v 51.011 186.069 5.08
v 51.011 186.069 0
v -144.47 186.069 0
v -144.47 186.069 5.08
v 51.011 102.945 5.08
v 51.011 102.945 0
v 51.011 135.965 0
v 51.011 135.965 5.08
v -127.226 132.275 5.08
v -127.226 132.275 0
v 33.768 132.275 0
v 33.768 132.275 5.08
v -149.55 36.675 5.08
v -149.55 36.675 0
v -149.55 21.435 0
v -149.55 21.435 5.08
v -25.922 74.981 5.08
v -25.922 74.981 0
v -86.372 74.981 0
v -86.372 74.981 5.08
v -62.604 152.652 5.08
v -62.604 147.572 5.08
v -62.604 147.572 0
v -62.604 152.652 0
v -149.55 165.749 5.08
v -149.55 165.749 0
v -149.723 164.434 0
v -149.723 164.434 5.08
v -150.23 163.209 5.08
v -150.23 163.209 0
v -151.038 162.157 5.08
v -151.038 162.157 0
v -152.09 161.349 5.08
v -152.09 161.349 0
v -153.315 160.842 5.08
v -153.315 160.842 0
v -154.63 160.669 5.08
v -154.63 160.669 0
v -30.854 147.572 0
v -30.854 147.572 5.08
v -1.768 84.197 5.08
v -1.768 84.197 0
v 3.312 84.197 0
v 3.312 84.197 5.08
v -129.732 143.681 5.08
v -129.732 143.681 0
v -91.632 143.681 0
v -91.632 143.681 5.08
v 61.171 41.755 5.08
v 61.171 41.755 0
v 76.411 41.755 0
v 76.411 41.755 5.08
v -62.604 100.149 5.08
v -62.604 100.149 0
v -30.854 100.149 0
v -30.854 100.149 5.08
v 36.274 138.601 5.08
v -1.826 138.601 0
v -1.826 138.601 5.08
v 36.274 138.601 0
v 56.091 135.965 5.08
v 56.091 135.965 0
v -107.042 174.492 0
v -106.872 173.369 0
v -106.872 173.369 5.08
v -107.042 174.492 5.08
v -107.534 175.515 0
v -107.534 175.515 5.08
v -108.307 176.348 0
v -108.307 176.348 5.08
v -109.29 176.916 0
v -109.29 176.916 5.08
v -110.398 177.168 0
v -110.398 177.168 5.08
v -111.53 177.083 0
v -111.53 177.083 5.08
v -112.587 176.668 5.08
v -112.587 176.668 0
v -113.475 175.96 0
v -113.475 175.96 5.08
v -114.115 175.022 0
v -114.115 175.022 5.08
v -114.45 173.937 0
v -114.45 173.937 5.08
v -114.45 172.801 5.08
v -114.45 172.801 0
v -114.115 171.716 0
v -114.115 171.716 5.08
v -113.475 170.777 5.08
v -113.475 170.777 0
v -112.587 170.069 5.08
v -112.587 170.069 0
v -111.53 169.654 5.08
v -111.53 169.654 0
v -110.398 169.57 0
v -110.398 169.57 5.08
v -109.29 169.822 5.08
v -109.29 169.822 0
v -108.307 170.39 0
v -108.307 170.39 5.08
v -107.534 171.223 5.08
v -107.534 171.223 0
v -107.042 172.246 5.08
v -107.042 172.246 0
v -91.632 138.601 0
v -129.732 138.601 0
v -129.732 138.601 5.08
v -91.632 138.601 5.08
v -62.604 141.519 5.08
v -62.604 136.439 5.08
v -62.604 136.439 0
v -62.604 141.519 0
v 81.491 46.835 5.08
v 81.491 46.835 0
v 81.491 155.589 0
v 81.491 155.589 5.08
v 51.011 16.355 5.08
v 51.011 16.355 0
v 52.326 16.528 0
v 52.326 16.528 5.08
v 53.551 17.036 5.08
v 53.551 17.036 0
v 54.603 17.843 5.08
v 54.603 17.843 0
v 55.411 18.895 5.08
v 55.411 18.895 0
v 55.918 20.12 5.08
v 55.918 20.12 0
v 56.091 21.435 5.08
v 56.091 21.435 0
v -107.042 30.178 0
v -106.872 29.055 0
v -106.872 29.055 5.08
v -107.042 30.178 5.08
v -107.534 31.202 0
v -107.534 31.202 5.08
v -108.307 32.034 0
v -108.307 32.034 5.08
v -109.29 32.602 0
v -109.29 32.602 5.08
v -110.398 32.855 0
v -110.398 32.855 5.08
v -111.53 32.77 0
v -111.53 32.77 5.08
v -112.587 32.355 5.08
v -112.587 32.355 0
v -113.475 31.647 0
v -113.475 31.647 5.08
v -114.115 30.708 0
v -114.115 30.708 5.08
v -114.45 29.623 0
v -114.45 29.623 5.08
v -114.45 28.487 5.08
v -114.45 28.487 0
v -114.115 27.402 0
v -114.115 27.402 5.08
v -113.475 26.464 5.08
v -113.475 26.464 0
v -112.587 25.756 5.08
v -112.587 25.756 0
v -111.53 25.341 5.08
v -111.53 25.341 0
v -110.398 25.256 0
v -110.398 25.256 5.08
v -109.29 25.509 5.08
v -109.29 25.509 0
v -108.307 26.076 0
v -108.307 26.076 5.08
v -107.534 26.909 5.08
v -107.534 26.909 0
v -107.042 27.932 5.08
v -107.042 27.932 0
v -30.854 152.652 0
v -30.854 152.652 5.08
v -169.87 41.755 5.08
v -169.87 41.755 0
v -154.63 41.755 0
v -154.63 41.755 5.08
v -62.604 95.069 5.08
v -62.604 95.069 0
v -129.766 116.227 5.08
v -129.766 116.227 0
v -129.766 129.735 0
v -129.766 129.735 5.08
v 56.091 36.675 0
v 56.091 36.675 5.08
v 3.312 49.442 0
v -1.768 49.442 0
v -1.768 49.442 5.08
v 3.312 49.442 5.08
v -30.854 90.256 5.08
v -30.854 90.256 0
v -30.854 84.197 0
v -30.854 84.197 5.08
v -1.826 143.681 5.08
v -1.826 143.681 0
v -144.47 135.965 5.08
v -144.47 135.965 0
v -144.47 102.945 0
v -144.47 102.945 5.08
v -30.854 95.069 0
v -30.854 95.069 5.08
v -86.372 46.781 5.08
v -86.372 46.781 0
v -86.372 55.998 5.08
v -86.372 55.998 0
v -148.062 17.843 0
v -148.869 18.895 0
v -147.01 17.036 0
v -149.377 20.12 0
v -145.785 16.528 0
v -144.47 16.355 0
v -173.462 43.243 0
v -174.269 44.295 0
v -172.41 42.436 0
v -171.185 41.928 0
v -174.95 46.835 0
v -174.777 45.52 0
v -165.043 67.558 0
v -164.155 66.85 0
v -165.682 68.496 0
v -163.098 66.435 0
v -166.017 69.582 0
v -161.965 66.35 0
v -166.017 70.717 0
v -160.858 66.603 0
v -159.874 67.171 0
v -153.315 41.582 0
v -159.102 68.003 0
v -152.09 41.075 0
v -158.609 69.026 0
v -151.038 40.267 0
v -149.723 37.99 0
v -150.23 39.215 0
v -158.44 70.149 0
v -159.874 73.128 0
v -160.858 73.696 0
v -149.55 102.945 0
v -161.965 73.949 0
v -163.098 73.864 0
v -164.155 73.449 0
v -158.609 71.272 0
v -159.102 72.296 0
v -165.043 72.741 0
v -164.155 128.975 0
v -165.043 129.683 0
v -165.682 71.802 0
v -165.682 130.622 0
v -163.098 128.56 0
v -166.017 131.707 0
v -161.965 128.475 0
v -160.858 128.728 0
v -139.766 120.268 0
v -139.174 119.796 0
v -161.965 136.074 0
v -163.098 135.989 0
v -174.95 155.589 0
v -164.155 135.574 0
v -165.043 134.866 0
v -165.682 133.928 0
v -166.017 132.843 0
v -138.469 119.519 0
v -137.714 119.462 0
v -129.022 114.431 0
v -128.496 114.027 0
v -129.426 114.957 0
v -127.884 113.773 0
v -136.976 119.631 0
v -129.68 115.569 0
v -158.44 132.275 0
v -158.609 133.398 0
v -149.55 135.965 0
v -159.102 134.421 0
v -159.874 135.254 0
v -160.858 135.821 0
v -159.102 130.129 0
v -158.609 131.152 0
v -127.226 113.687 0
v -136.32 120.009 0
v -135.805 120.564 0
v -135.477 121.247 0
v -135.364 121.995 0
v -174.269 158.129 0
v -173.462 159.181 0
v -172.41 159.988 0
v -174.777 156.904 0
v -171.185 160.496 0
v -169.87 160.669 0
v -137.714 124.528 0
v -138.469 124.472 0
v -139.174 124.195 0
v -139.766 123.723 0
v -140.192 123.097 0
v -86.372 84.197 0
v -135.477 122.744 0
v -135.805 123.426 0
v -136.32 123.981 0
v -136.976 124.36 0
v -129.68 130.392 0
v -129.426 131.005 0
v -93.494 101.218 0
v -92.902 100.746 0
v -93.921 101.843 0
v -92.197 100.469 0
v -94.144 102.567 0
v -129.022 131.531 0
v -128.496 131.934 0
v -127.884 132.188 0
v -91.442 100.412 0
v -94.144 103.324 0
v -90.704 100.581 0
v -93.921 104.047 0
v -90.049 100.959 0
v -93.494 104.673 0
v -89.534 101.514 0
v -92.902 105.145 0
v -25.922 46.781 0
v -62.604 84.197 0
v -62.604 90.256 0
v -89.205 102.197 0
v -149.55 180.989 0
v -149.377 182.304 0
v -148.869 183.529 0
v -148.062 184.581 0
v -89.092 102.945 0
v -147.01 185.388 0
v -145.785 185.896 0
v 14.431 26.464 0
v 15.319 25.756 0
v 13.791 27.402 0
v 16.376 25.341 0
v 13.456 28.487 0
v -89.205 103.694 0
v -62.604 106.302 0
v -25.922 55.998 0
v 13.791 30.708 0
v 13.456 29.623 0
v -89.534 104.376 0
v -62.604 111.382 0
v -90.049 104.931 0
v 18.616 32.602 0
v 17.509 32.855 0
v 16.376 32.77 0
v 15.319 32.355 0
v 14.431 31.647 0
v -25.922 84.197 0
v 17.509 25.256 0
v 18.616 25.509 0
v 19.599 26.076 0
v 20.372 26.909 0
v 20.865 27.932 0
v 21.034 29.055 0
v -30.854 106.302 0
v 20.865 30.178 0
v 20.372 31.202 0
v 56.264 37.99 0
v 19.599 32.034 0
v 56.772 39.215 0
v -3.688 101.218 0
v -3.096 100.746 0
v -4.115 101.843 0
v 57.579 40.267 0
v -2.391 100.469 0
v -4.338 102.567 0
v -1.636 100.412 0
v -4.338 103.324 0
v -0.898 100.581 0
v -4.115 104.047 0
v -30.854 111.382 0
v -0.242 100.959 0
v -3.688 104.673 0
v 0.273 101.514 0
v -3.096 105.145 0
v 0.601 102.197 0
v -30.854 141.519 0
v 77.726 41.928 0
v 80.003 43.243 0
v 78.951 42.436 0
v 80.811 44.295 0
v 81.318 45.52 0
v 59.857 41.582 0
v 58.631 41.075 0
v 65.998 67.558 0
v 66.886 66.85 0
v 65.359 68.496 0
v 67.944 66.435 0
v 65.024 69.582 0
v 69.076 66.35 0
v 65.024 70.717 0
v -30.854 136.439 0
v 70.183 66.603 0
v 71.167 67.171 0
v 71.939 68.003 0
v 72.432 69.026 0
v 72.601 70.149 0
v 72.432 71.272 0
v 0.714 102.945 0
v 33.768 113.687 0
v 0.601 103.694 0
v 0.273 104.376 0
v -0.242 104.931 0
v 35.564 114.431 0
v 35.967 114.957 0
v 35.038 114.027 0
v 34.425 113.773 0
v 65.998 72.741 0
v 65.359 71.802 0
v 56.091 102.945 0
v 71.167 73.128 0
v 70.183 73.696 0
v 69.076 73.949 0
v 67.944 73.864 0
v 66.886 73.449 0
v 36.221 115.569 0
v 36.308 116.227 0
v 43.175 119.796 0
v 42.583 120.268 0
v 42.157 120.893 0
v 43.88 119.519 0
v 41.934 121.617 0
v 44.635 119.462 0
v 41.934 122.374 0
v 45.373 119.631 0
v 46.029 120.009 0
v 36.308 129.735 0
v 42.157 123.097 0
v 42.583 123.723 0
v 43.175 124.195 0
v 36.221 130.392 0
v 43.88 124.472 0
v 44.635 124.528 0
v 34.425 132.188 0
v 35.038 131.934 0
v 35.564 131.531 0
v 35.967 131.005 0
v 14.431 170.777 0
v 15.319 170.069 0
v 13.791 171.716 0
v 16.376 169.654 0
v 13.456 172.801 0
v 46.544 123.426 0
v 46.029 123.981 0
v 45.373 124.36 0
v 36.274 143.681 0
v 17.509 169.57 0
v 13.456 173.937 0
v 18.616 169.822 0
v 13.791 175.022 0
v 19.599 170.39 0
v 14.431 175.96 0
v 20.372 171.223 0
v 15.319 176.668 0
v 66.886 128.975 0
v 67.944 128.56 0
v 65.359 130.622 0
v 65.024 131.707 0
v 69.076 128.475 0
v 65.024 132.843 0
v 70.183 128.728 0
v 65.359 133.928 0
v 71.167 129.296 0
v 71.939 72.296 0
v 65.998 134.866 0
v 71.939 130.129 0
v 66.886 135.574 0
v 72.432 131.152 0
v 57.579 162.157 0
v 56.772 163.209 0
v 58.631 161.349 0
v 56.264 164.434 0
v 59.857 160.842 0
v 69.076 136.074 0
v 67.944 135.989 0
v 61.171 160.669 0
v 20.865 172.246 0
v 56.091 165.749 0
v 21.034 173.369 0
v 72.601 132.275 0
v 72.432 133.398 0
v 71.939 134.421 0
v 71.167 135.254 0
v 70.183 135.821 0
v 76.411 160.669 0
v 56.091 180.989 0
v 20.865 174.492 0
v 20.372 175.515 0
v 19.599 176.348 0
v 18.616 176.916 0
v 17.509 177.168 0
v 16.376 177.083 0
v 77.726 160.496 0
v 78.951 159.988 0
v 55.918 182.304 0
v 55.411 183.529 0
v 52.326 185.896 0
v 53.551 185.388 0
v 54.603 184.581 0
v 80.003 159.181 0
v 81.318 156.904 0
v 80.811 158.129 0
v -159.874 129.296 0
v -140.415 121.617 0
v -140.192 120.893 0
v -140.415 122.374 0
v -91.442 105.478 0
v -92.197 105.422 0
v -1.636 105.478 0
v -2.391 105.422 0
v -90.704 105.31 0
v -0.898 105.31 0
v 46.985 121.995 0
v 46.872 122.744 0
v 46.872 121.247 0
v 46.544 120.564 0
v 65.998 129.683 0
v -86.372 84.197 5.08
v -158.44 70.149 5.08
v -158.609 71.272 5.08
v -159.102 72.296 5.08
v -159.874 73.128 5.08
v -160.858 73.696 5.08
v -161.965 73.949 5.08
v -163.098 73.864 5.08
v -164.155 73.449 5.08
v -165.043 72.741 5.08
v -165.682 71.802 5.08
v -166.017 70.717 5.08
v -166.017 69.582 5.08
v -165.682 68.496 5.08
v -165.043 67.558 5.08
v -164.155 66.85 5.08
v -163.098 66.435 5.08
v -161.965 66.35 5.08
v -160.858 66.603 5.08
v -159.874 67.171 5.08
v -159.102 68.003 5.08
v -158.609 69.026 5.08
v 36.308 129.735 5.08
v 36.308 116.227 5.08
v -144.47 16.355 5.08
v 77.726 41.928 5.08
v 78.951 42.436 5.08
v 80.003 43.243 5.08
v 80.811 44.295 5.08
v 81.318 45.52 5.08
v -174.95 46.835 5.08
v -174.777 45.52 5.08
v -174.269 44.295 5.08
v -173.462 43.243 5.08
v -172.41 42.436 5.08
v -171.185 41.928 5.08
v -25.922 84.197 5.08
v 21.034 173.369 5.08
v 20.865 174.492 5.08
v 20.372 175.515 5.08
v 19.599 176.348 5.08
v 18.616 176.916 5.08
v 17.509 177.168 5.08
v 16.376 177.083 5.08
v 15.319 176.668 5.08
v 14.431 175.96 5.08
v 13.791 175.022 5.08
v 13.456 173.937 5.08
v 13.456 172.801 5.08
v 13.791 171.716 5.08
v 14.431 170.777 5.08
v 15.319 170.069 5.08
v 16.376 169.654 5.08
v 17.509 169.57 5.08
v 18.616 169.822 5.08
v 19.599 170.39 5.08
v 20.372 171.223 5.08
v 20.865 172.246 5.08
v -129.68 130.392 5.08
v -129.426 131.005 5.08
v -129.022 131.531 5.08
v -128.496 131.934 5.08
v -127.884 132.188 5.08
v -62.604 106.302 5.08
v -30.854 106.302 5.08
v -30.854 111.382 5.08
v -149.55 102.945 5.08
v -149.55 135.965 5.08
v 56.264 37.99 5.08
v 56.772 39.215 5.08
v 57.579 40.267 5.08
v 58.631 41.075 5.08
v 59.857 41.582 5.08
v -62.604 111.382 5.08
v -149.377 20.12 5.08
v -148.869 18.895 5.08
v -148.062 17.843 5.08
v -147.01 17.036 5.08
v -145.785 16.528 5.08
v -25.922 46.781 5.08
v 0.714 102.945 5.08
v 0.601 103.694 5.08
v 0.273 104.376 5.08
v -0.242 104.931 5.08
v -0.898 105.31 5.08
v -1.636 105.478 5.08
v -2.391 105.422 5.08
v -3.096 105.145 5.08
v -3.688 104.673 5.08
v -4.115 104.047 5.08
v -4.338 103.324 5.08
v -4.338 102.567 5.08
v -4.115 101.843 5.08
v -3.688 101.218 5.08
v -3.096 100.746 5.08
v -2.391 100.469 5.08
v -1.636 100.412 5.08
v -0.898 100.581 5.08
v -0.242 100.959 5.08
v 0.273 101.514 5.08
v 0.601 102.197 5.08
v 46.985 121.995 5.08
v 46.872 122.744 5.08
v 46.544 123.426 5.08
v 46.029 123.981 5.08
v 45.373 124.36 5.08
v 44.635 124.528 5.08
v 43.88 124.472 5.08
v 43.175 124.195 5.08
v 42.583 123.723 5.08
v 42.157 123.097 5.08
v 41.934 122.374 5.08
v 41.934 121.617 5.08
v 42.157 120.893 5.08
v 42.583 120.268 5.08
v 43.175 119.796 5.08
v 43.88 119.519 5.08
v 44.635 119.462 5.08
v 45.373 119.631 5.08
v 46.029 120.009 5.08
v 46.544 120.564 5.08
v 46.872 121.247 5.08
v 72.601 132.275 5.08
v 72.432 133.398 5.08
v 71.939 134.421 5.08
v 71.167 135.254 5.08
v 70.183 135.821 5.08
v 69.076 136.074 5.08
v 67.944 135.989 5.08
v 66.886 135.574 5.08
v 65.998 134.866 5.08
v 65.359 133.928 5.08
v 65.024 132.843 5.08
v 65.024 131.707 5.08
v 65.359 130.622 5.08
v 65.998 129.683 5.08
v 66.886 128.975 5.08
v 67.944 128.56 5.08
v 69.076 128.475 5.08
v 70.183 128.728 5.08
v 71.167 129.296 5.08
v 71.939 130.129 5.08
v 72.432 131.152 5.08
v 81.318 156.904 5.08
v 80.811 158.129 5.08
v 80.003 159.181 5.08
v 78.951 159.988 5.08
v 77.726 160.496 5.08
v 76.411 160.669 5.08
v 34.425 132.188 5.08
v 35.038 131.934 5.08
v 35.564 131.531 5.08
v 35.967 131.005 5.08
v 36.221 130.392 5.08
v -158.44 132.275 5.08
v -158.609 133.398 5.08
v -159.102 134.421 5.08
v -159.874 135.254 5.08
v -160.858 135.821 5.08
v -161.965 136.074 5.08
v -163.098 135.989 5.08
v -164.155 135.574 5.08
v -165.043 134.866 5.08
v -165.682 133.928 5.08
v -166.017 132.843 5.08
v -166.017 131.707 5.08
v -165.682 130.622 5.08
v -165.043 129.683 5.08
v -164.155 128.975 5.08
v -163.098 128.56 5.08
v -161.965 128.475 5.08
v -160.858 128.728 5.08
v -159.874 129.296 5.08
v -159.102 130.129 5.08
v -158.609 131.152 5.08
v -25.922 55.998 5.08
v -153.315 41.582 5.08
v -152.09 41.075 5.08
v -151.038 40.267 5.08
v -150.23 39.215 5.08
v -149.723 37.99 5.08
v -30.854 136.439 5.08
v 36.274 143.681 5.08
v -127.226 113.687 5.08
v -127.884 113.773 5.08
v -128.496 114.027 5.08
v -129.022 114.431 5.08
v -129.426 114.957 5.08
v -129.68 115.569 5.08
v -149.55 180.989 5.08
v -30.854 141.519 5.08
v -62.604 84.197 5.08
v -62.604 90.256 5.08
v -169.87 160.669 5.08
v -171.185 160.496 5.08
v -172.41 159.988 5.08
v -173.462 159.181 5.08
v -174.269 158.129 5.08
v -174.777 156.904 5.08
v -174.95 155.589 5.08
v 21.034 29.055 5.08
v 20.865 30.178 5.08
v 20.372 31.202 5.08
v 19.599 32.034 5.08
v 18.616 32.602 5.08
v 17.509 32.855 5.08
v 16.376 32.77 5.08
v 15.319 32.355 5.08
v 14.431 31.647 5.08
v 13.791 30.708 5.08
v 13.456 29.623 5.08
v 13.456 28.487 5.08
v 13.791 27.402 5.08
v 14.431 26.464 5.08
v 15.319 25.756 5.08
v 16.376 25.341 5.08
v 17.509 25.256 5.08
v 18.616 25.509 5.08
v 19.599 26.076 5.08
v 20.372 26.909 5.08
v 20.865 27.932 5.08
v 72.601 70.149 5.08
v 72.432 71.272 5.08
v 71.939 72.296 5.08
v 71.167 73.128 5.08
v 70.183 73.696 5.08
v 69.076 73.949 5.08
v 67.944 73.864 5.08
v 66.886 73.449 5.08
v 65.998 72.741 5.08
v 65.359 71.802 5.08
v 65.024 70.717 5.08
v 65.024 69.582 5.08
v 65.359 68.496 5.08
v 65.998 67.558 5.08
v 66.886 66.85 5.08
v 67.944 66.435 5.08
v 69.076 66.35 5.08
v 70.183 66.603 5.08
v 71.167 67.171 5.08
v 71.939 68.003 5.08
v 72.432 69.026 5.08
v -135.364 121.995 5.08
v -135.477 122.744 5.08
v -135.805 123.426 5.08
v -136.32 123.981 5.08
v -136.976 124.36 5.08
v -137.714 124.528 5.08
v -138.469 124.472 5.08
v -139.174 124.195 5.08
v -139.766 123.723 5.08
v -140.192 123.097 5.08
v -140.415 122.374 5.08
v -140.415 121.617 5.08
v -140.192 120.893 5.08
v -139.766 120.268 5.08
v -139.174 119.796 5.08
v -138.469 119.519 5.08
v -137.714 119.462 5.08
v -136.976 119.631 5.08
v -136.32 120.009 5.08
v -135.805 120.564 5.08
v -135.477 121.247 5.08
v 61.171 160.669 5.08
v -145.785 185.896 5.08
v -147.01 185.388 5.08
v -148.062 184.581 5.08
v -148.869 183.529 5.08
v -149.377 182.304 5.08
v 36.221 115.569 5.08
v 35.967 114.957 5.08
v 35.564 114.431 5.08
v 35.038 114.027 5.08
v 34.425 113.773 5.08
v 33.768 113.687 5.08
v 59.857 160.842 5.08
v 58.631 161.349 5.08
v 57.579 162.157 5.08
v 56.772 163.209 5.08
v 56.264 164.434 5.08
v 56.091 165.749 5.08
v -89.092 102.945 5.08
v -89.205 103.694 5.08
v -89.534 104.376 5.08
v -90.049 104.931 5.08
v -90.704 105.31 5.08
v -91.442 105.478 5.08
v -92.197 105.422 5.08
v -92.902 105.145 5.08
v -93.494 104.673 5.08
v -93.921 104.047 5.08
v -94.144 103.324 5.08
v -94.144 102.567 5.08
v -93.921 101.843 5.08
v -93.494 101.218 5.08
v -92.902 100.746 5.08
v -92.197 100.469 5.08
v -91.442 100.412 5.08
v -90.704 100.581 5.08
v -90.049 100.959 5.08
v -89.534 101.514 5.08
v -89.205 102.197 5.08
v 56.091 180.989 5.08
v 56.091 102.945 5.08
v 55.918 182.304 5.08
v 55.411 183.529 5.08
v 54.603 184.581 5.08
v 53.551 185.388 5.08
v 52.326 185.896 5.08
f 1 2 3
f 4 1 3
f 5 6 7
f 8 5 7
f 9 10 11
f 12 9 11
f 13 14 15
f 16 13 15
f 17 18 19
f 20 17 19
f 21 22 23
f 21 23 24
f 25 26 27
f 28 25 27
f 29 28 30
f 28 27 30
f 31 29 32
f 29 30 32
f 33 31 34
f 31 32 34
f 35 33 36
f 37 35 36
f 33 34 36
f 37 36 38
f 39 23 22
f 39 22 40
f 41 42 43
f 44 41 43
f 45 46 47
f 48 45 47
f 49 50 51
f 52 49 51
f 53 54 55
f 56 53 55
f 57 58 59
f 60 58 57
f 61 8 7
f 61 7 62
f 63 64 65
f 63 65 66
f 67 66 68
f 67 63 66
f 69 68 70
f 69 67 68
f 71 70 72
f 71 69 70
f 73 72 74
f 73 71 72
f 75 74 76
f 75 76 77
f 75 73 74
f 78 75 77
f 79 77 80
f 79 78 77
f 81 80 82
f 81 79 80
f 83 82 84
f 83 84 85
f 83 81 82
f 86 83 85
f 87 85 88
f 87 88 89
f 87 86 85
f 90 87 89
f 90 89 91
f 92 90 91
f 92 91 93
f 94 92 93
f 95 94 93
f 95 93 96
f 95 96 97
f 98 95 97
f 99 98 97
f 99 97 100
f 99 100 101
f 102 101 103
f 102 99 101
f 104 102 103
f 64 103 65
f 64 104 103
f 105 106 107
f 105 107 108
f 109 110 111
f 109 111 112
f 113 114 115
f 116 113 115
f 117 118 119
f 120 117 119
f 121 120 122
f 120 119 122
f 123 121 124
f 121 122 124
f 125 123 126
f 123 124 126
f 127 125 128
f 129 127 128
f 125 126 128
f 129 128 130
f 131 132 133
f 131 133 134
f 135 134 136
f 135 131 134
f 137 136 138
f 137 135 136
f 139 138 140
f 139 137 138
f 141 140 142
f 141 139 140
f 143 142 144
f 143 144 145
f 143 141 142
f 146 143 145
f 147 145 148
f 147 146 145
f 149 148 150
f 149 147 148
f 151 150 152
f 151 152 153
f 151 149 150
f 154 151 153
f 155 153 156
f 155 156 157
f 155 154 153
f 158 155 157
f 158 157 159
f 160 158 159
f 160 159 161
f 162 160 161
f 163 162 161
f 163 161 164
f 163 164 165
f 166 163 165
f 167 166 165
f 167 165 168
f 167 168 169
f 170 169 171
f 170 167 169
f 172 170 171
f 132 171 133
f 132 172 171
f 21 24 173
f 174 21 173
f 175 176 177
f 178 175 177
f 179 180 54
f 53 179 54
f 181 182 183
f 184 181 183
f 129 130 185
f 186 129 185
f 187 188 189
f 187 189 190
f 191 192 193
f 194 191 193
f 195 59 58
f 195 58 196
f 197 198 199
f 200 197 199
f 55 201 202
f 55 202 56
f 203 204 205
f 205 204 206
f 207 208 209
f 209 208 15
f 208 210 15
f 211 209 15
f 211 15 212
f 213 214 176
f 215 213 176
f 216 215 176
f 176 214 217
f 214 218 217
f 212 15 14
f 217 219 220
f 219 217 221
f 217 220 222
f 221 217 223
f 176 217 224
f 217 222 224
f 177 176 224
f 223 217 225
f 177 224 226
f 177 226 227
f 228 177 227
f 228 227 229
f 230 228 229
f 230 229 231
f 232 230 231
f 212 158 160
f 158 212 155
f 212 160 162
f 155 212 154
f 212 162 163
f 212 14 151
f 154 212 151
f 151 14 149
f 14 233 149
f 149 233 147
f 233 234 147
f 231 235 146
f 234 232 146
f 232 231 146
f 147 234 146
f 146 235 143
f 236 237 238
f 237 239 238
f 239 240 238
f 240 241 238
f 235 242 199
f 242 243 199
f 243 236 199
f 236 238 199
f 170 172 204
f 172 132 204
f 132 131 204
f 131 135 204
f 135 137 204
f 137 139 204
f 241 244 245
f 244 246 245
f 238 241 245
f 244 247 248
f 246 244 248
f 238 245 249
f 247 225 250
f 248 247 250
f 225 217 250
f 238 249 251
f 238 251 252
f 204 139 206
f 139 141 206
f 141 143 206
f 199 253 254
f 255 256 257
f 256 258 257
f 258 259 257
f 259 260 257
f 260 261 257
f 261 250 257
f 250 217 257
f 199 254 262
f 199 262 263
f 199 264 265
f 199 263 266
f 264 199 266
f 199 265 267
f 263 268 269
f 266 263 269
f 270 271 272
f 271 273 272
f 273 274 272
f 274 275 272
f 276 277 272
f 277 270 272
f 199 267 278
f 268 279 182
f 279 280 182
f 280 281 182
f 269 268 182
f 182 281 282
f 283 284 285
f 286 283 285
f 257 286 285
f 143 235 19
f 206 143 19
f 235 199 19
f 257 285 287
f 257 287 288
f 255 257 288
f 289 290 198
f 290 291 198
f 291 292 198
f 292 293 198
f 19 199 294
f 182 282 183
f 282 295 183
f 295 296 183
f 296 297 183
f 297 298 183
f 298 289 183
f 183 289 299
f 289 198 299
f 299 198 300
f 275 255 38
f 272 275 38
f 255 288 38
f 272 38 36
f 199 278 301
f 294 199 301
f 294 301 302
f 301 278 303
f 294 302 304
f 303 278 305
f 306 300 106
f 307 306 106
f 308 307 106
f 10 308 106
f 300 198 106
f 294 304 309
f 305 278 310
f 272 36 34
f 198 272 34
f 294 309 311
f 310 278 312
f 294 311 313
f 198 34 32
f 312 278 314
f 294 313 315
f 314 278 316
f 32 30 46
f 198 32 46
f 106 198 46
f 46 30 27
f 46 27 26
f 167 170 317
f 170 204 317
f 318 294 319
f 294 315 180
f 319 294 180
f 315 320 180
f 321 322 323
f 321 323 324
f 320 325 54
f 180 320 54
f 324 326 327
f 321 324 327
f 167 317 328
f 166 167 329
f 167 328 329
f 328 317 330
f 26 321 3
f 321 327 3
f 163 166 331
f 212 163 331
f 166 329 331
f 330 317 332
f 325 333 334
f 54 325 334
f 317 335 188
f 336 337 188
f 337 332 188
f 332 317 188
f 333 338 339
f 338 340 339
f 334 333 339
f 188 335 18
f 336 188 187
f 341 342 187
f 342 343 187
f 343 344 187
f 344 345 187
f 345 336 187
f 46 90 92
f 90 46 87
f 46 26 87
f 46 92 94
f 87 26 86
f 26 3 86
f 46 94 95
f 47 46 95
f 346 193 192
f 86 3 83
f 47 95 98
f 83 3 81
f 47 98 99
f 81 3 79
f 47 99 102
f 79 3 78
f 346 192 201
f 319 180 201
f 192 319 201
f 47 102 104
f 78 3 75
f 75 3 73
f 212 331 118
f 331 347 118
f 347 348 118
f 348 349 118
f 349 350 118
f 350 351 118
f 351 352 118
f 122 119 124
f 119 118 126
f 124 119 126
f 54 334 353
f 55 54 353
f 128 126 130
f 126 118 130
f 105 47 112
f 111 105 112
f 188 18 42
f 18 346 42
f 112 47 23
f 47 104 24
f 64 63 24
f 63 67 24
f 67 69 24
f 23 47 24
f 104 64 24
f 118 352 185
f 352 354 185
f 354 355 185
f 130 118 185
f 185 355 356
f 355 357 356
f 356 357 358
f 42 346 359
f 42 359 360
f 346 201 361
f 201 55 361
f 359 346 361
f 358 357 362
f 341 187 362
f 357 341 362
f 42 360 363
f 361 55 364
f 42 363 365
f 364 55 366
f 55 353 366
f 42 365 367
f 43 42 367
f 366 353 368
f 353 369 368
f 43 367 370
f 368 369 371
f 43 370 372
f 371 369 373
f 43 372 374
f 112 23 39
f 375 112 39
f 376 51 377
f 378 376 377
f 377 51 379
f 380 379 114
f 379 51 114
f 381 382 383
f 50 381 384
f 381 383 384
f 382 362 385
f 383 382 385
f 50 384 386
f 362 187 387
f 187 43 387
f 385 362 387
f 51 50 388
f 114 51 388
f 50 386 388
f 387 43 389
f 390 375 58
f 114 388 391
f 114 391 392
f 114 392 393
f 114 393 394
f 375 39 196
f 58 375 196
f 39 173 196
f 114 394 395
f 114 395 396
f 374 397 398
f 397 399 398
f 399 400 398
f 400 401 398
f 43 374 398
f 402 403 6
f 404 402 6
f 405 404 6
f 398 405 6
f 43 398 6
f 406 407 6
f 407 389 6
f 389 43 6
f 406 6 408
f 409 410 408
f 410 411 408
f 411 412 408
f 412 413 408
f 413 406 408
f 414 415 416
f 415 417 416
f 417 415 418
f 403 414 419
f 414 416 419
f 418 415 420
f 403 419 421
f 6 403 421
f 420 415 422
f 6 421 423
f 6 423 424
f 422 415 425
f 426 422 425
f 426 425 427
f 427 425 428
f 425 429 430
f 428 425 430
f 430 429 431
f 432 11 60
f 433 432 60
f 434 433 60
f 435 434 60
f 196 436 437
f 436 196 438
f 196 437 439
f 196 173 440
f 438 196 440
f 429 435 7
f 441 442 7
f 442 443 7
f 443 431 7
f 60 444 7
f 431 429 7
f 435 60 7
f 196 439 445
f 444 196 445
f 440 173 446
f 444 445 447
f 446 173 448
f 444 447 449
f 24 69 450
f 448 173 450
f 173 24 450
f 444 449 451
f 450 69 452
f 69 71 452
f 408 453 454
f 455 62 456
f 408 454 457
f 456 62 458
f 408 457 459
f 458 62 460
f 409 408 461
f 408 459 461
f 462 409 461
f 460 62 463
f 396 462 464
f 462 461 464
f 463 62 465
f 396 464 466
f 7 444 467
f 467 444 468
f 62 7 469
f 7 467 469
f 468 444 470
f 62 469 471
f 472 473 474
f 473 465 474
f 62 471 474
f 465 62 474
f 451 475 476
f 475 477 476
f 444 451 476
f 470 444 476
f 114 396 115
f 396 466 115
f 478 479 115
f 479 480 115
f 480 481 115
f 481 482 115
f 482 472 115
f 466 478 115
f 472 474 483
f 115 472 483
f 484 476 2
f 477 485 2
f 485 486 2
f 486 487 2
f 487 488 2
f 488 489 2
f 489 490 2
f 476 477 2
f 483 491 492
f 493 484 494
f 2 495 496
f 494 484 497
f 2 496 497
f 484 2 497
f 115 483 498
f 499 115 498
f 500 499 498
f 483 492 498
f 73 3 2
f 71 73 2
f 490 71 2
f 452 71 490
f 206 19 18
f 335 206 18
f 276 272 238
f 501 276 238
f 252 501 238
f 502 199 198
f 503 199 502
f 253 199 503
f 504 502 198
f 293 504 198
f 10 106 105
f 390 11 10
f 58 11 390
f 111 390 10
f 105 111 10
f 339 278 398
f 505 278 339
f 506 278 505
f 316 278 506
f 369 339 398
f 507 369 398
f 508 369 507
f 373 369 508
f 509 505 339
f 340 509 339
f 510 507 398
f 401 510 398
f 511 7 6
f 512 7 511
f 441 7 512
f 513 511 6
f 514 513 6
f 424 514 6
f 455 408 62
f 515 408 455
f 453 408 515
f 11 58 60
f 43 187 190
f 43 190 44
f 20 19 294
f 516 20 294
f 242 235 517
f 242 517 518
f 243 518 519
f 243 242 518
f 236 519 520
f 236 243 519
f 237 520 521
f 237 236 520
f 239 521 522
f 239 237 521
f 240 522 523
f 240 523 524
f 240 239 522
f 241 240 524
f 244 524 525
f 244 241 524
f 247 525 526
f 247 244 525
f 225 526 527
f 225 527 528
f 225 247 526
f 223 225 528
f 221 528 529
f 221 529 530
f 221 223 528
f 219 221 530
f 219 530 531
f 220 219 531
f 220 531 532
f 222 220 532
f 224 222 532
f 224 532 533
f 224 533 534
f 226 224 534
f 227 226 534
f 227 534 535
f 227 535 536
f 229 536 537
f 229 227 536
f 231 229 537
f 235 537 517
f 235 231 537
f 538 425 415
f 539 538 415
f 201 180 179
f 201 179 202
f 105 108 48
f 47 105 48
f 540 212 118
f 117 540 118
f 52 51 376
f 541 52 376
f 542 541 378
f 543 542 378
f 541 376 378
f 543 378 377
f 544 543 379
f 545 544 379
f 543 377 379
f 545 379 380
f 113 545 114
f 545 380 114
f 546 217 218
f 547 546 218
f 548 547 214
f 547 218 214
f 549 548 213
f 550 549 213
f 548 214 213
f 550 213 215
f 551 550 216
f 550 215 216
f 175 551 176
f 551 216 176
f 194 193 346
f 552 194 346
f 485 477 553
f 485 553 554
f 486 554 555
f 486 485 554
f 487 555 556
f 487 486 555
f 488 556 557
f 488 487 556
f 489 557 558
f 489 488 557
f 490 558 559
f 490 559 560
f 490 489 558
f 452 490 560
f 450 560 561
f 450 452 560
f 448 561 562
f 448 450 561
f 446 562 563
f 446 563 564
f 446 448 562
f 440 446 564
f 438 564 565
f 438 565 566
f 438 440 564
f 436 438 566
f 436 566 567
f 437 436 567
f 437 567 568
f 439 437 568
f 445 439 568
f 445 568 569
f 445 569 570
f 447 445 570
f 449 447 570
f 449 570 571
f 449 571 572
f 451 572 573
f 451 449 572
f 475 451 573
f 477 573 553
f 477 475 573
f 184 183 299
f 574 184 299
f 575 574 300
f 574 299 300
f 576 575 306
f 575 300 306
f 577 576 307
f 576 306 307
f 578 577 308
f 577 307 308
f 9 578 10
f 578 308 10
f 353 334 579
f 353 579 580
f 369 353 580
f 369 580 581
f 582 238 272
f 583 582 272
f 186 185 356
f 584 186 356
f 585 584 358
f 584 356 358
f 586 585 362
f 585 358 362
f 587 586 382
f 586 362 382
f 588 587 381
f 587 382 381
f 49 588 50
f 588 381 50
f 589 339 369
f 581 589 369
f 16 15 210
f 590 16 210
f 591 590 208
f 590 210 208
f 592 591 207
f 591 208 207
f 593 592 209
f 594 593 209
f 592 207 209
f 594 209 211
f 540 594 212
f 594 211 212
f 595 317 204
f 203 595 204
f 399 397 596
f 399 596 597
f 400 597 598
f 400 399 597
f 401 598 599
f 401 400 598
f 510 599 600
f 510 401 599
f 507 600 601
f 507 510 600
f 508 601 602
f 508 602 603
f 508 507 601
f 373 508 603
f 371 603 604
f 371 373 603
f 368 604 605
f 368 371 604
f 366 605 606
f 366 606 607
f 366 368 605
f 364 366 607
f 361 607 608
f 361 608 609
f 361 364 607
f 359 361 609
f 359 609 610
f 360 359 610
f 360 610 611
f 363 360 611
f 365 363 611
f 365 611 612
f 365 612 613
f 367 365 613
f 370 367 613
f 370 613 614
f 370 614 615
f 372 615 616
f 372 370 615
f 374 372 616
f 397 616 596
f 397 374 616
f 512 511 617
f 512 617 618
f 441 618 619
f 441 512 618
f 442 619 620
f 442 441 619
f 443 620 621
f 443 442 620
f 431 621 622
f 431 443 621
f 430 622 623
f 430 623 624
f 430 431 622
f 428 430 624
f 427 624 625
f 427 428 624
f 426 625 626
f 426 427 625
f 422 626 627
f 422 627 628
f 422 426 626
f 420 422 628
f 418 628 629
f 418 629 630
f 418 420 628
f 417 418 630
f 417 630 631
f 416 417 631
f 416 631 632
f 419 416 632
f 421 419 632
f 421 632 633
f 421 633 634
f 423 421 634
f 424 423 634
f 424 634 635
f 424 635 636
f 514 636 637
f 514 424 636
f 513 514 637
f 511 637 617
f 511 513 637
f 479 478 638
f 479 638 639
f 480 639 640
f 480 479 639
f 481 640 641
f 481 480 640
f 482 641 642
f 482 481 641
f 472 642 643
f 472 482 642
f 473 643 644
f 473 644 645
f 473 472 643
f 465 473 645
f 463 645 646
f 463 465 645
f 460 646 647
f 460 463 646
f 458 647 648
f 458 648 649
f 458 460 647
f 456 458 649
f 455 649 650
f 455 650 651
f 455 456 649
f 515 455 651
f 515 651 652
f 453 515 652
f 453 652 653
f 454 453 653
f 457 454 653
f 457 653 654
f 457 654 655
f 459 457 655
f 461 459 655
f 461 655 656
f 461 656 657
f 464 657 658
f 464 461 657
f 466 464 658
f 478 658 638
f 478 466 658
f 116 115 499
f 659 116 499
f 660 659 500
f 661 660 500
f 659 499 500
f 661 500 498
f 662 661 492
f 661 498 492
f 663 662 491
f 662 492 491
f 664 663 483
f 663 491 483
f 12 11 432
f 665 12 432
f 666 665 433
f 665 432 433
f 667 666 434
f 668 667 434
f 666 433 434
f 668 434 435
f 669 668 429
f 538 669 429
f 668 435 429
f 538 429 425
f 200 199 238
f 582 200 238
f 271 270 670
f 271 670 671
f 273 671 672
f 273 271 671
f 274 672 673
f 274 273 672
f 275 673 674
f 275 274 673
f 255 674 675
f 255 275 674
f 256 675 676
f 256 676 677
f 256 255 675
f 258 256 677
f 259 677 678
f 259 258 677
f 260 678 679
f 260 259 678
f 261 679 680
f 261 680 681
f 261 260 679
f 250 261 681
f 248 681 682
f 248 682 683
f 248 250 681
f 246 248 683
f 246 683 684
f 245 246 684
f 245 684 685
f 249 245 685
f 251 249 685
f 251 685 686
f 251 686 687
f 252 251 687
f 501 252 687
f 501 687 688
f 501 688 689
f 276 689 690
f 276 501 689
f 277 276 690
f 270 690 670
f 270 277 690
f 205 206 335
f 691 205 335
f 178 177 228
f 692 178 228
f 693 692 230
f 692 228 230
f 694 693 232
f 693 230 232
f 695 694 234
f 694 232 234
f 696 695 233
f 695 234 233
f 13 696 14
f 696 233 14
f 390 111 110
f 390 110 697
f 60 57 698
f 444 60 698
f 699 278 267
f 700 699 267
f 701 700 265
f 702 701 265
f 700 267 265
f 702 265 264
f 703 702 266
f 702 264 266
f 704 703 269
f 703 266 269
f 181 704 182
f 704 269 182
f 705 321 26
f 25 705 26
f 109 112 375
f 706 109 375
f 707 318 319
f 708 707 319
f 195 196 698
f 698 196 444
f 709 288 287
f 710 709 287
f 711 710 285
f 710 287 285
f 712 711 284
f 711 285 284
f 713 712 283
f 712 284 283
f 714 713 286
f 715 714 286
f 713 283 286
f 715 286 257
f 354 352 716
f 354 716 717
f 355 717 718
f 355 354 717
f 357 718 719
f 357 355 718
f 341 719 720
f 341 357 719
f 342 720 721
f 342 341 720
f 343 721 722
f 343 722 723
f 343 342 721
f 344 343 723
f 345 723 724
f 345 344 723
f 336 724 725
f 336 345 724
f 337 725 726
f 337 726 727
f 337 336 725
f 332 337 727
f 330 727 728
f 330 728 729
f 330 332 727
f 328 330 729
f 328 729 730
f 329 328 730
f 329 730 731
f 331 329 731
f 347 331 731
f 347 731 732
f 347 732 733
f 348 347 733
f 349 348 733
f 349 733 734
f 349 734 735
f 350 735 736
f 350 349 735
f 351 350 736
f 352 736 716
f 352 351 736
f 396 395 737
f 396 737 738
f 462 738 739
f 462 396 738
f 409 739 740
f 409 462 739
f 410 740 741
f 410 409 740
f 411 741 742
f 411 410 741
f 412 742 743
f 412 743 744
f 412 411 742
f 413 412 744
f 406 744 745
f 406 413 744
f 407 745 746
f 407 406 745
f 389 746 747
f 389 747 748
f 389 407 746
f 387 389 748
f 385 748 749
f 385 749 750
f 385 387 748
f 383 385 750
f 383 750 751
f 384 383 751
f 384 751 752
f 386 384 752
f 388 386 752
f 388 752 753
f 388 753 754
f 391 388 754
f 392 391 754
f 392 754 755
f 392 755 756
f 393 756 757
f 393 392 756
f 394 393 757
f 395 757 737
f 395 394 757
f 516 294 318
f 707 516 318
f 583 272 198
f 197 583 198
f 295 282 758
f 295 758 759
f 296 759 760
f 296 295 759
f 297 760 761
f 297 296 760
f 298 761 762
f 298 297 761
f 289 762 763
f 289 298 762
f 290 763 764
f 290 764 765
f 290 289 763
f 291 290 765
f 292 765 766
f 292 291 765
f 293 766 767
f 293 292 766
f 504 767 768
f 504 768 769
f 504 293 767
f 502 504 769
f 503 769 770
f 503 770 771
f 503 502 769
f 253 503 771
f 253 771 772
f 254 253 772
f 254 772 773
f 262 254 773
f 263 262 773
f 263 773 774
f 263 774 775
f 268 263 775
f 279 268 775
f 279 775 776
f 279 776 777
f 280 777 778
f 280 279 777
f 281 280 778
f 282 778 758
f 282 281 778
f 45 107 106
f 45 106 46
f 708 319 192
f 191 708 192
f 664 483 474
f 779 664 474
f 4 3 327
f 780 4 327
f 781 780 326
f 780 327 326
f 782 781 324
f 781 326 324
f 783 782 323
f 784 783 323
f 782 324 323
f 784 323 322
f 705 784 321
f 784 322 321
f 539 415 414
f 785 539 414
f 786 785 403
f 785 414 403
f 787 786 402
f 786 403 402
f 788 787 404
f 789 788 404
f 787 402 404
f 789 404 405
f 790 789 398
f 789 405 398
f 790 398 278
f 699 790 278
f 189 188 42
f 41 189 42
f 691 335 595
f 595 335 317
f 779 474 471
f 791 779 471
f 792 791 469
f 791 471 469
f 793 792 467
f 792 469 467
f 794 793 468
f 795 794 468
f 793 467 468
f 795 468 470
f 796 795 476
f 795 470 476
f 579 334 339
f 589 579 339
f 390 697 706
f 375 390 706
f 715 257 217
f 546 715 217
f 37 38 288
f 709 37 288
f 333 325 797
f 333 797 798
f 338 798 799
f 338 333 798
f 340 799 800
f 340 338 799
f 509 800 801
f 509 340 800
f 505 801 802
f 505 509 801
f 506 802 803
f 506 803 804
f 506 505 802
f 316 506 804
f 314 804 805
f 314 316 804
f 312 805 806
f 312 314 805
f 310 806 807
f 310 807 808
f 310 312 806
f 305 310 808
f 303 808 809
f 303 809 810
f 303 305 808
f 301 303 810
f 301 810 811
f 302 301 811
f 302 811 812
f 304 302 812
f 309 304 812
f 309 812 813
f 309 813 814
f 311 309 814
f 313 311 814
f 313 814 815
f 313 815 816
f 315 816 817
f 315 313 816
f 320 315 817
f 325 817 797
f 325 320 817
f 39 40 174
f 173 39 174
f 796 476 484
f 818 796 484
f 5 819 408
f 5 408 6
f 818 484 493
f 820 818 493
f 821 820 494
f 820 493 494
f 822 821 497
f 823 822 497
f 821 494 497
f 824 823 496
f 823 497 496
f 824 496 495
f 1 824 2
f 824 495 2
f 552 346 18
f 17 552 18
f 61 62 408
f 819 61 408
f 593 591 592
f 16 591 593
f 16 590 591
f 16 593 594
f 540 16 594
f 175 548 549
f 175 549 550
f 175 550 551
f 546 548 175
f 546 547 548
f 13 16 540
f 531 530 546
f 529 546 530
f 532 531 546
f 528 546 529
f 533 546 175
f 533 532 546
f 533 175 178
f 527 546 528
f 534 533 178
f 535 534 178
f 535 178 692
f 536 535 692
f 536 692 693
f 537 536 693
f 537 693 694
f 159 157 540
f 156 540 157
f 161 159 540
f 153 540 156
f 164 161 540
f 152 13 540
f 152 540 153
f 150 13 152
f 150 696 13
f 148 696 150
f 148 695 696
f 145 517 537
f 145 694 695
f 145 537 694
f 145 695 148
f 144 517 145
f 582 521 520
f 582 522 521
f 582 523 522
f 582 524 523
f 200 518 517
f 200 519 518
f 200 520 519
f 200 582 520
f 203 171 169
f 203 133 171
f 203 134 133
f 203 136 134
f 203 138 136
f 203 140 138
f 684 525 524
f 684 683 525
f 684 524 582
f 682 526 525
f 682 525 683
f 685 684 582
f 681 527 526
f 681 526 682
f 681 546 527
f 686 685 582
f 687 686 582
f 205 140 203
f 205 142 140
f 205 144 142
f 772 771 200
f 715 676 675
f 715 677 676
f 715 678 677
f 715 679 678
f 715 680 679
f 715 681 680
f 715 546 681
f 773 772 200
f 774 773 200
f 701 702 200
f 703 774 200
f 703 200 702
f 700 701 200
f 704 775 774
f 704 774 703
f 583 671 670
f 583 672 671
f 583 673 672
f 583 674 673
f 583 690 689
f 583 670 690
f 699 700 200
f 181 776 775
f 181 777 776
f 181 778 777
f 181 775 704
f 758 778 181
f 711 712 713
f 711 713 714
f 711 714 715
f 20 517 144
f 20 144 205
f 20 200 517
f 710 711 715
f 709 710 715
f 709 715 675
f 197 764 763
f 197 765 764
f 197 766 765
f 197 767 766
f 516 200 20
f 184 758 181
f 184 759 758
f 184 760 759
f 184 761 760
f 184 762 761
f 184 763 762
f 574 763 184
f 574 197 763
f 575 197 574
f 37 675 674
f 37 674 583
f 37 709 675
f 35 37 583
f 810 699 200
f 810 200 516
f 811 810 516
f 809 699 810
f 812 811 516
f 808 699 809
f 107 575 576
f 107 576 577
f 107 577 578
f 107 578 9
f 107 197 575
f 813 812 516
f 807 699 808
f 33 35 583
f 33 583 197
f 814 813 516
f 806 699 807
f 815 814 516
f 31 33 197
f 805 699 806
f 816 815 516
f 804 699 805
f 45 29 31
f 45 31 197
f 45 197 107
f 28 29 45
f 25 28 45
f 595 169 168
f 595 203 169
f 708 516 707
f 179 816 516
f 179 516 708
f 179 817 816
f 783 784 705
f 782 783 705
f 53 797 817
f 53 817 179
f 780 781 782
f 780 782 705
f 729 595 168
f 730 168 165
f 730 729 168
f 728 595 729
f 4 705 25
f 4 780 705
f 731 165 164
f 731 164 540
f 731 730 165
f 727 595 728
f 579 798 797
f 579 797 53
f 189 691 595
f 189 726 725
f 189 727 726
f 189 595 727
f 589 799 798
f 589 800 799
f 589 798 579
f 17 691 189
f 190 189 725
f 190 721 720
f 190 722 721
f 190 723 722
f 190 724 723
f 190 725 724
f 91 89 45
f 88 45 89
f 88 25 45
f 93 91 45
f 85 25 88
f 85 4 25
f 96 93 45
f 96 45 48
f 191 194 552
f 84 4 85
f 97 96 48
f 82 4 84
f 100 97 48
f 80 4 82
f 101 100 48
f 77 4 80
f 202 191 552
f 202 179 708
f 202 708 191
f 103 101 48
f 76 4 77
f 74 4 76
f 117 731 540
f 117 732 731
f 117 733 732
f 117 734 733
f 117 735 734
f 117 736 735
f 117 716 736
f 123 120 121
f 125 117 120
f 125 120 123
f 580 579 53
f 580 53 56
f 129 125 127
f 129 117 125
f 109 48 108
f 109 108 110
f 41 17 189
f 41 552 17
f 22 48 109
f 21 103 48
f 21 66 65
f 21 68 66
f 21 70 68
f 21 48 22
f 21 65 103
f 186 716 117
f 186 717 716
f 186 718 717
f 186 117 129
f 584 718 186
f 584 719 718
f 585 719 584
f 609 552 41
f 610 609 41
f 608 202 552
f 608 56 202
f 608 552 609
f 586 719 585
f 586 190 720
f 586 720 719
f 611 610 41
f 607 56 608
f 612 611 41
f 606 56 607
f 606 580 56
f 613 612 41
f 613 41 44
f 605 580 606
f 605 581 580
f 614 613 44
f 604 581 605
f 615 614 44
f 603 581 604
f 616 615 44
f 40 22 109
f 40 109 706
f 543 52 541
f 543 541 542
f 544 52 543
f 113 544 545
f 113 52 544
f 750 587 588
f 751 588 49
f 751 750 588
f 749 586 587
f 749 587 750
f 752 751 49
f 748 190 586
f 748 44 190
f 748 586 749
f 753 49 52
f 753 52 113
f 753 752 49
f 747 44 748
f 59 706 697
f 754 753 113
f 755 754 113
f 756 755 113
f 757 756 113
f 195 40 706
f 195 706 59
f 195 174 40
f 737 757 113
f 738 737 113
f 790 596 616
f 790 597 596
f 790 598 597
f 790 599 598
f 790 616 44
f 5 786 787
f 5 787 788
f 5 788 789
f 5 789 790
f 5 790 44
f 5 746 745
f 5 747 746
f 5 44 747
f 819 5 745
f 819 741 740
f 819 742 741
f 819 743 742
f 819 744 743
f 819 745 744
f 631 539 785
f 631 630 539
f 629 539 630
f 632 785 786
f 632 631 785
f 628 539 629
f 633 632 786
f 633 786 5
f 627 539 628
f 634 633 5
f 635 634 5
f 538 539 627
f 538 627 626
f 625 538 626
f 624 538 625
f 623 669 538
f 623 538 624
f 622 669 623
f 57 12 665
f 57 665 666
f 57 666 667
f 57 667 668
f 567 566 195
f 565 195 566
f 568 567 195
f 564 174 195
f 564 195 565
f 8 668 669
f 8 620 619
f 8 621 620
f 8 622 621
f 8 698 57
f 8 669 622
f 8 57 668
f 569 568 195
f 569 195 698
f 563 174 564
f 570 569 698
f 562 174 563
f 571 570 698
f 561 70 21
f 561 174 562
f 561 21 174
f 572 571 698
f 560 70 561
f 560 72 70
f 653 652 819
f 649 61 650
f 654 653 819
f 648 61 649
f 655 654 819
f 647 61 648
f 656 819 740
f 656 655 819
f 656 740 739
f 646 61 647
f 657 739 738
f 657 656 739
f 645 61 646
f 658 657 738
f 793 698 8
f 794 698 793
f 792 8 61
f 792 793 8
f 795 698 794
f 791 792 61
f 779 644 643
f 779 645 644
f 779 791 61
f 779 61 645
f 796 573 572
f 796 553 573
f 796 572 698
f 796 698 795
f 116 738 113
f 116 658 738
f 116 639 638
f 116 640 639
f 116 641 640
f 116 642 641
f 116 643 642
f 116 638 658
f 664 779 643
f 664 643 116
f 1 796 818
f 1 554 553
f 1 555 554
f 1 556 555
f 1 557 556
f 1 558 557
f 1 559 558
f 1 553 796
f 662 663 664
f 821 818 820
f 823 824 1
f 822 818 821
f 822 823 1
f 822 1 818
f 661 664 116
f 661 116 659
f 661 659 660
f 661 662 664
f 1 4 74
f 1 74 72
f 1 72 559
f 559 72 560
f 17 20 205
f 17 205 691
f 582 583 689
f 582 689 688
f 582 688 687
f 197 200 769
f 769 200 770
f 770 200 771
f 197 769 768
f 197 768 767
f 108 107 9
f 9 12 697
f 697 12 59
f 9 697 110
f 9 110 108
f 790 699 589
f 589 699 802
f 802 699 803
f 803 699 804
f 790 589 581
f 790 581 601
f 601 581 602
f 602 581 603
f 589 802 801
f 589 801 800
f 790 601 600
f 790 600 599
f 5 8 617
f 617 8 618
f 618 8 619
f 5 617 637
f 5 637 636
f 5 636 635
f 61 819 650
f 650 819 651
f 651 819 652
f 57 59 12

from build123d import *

# Parameters (mm, degrees)
SKETCH1_R           = 3.81
SKETCH1_W           = 5.08
SKETCH1_H           = 34.754656801
SKETCH1_W_2         = 31.75
SKETCH1_H_2         = 5.08
SKETCH1_R_2         = 2.54
SKETCH1_W_3         = 38.1
BOSS_EXTRUDE1_DEPTH = 5.08


with BuildPart() as part:
    # Sketch1 → Boss-Extrude1 (new body)
    with BuildSketch(Plane.XY):
        with BuildLine():
            ThreePointArc((51.011314264, 16.355277108), (54.603416713, 17.84317466), (56.091314264, 21.435277108))
            Line((56.091314264, 21.435277108), (56.091314264, 36.675277108))
            ThreePointArc((56.091314264, 36.675277108), (57.579211816, 40.267379557), (61.171314264, 41.755277108))
            Line((61.171314264, 41.755277108), (76.411314264, 41.755277108))
            ThreePointArc((76.411314264, 41.755277108), (80.003416713, 43.24317466), (81.491314264, 46.835277108))
            Line((81.491314264, 46.835277108), (81.491314264, 155.588877174))
            ThreePointArc((81.491314264, 155.588877174), (80.003416713, 159.180979622), (76.411314264, 160.668877174))
            Line((76.411314264, 160.668877174), (61.171314264, 160.668877174))
            ThreePointArc((61.171314264, 160.668877174), (57.579211816, 162.156774726), (56.091314264, 165.748877174))
            Line((56.091314264, 165.748877174), (56.091314264, 180.988877174))
            ThreePointArc((56.091314264, 180.988877174), (54.603416713, 184.580979622), (51.011314264, 186.068877174))
            Line((51.011314264, 186.068877174), (-144.469703574, 186.068877174))
            ThreePointArc((-144.469703574, 186.068877174), (-148.061806022, 184.580979622), (-149.549703574, 180.988877174))
            Line((-149.549703574, 180.988877174), (-149.549703574, 165.748877174))
            ThreePointArc((-149.549703574, 165.748877174), (-151.037601126, 162.156774726), (-154.629703574, 160.668877174))
            Line((-154.629703574, 160.668877174), (-169.869703574, 160.668877174))
            ThreePointArc((-169.869703574, 160.668877174), (-173.461806022, 159.180979622), (-174.949703574, 155.588877174))
            Line((-174.949703574, 155.588877174), (-174.949703574, 46.835277108))
            ThreePointArc((-174.949703574, 46.835277108), (-173.461806022, 43.24317466), (-169.869703574, 41.755277108))
            Line((-169.869703574, 41.755277108), (-154.629703574, 41.755277108))
            ThreePointArc((-154.629703574, 41.755277108), (-151.037601126, 40.267379557), (-149.549703574, 36.675277108))
            Line((-149.549703574, 36.675277108), (-149.549703574, 21.435277108))
            ThreePointArc((-149.549703574, 21.435277108), (-148.061806022, 17.84317466), (-144.469703574, 16.355277108))
            Line((-144.469703574, 16.355277108), (51.011314264, 16.355277108))
        make_face()
        with Locations((-110.682245407, 29.055277108)):
            Circle(SKETCH1_R, mode=Mode.SUBTRACT)
        Polygon((-25.922239135, 55.997635261), (-25.922239135, 49.700309173), (-25.922239135, 46.781251801), (-86.372159657, 46.781251801), (-86.372159657, 55.997635261), align=None, mode=Mode.SUBTRACT)
        with Locations((-162.249703574, 70.149378101)):
            Circle(SKETCH1_R, mode=Mode.SUBTRACT)
        Polygon((-25.922239135, 84.197043075), (-25.922239135, 77.899716987), (-25.922239135, 74.980659615), (-86.372159657, 74.980659615), (-86.372159657, 84.197043075), (-62.604194655, 84.197043075), (-62.604194655, 90.255887093), (-30.854194655, 90.255887093), (-30.854194655, 84.197043075), align=None, mode=Mode.SUBTRACT)
        with Locations((17.223856098, 29.055277108)):
            Circle(SKETCH1_R, mode=Mode.SUBTRACT)
        with Locations((0.772267685, 66.819714675)):
            Rectangle(SKETCH1_W, SKETCH1_H, mode=Mode.SUBTRACT)
        with Locations((-46.729194655, 97.608815198)):
            Rectangle(SKETCH1_W_2, SKETCH1_H_2, mode=Mode.SUBTRACT)
        with Locations((68.791314264, 70.149378101)):
            Circle(SKETCH1_R, mode=Mode.SUBTRACT)
        Polygon((-149.549703574, 135.965208253), (-144.469703574, 135.965208253), (-144.469703574, 127.195635913), (-144.469703574, 102.945208253), (-149.549703574, 102.945208253), align=None, mode=Mode.SUBTRACT)
        with Locations((-137.903692136, 121.995208253)):
            Circle(SKETCH1_R_2, mode=Mode.SUBTRACT)
        with Locations((-162.249703574, 132.274776181)):
            Circle(SKETCH1_R, mode=Mode.SUBTRACT)
        with Locations((-91.632245407, 102.945208253)):
            Circle(SKETCH1_R_2, mode=Mode.SUBTRACT)
        with Locations((-110.682245407, 141.140921067)):
            Rectangle(SKETCH1_W_3, SKETCH1_H_2, mode=Mode.SUBTRACT)
        with Locations((-110.682245407, 173.368877174)):
            Circle(SKETCH1_R, mode=Mode.SUBTRACT)
        with Locations((-46.729194655, 108.841683137)):
            Rectangle(SKETCH1_W_2, SKETCH1_H_2, mode=Mode.SUBTRACT)
        with Locations((-1.826143902, 102.945208253)):
            Circle(SKETCH1_R_2, mode=Mode.SUBTRACT)
        with BuildLine():
            ThreePointArc((33.767746549, 132.274776181), (35.563797773, 131.530827406), (36.307746549, 129.734776181))
            Line((36.307746549, 129.734776181), (36.307746549, 127.195635913))
            Line((36.307746549, 127.195635913), (36.307746549, 116.226694176))
            ThreePointArc((36.307746549, 116.226694176), (35.563797773, 114.430642952), (33.767746549, 113.686694176))
            Line((33.767746549, 113.686694176), (-127.226135859, 113.686694176))
            ThreePointArc((-127.226135859, 113.686694176), (-129.022187083, 114.430642952), (-129.766135859, 116.226694176))
            Line((-129.766135859, 116.226694176), (-129.766135859, 127.195635913))
            Line((-129.766135859, 127.195635913), (-129.766135859, 129.734776181))
            ThreePointArc((-129.766135859, 129.734776181), (-129.022187083, 131.530827406), (-127.226135859, 132.274776181))
            Line((-127.226135859, 132.274776181), (33.767746549, 132.274776181))
        make_face(mode=Mode.SUBTRACT)
        with Locations((-46.729194655, 138.978682913)):
            Rectangle(SKETCH1_W_2, SKETCH1_H_2, mode=Mode.SUBTRACT)
        with Locations((17.223856098, 141.140921067)):
            Rectangle(SKETCH1_W_3, SKETCH1_H_2, mode=Mode.SUBTRACT)
        with Locations((44.445302826, 121.995208253)):
            Circle(SKETCH1_R_2, mode=Mode.SUBTRACT)
        Polygon((51.011314264, 127.195635913), (51.011314264, 135.965208253), (56.091314264, 135.965208253), (56.091314264, 102.945208253), (51.011314264, 102.945208253), align=None, mode=Mode.SUBTRACT)
        with Locations((68.791314264, 132.274776181)):
            Circle(SKETCH1_R, mode=Mode.SUBTRACT)
        with Locations((-46.729194655, 150.112295085)):
            Rectangle(SKETCH1_W_2, SKETCH1_H_2, mode=Mode.SUBTRACT)
        with Locations((17.223856098, 173.368877174)):
            Circle(SKETCH1_R, mode=Mode.SUBTRACT)
    extrude(amount=BOSS_EXTRUDE1_DEPTH)


solid = part.part
